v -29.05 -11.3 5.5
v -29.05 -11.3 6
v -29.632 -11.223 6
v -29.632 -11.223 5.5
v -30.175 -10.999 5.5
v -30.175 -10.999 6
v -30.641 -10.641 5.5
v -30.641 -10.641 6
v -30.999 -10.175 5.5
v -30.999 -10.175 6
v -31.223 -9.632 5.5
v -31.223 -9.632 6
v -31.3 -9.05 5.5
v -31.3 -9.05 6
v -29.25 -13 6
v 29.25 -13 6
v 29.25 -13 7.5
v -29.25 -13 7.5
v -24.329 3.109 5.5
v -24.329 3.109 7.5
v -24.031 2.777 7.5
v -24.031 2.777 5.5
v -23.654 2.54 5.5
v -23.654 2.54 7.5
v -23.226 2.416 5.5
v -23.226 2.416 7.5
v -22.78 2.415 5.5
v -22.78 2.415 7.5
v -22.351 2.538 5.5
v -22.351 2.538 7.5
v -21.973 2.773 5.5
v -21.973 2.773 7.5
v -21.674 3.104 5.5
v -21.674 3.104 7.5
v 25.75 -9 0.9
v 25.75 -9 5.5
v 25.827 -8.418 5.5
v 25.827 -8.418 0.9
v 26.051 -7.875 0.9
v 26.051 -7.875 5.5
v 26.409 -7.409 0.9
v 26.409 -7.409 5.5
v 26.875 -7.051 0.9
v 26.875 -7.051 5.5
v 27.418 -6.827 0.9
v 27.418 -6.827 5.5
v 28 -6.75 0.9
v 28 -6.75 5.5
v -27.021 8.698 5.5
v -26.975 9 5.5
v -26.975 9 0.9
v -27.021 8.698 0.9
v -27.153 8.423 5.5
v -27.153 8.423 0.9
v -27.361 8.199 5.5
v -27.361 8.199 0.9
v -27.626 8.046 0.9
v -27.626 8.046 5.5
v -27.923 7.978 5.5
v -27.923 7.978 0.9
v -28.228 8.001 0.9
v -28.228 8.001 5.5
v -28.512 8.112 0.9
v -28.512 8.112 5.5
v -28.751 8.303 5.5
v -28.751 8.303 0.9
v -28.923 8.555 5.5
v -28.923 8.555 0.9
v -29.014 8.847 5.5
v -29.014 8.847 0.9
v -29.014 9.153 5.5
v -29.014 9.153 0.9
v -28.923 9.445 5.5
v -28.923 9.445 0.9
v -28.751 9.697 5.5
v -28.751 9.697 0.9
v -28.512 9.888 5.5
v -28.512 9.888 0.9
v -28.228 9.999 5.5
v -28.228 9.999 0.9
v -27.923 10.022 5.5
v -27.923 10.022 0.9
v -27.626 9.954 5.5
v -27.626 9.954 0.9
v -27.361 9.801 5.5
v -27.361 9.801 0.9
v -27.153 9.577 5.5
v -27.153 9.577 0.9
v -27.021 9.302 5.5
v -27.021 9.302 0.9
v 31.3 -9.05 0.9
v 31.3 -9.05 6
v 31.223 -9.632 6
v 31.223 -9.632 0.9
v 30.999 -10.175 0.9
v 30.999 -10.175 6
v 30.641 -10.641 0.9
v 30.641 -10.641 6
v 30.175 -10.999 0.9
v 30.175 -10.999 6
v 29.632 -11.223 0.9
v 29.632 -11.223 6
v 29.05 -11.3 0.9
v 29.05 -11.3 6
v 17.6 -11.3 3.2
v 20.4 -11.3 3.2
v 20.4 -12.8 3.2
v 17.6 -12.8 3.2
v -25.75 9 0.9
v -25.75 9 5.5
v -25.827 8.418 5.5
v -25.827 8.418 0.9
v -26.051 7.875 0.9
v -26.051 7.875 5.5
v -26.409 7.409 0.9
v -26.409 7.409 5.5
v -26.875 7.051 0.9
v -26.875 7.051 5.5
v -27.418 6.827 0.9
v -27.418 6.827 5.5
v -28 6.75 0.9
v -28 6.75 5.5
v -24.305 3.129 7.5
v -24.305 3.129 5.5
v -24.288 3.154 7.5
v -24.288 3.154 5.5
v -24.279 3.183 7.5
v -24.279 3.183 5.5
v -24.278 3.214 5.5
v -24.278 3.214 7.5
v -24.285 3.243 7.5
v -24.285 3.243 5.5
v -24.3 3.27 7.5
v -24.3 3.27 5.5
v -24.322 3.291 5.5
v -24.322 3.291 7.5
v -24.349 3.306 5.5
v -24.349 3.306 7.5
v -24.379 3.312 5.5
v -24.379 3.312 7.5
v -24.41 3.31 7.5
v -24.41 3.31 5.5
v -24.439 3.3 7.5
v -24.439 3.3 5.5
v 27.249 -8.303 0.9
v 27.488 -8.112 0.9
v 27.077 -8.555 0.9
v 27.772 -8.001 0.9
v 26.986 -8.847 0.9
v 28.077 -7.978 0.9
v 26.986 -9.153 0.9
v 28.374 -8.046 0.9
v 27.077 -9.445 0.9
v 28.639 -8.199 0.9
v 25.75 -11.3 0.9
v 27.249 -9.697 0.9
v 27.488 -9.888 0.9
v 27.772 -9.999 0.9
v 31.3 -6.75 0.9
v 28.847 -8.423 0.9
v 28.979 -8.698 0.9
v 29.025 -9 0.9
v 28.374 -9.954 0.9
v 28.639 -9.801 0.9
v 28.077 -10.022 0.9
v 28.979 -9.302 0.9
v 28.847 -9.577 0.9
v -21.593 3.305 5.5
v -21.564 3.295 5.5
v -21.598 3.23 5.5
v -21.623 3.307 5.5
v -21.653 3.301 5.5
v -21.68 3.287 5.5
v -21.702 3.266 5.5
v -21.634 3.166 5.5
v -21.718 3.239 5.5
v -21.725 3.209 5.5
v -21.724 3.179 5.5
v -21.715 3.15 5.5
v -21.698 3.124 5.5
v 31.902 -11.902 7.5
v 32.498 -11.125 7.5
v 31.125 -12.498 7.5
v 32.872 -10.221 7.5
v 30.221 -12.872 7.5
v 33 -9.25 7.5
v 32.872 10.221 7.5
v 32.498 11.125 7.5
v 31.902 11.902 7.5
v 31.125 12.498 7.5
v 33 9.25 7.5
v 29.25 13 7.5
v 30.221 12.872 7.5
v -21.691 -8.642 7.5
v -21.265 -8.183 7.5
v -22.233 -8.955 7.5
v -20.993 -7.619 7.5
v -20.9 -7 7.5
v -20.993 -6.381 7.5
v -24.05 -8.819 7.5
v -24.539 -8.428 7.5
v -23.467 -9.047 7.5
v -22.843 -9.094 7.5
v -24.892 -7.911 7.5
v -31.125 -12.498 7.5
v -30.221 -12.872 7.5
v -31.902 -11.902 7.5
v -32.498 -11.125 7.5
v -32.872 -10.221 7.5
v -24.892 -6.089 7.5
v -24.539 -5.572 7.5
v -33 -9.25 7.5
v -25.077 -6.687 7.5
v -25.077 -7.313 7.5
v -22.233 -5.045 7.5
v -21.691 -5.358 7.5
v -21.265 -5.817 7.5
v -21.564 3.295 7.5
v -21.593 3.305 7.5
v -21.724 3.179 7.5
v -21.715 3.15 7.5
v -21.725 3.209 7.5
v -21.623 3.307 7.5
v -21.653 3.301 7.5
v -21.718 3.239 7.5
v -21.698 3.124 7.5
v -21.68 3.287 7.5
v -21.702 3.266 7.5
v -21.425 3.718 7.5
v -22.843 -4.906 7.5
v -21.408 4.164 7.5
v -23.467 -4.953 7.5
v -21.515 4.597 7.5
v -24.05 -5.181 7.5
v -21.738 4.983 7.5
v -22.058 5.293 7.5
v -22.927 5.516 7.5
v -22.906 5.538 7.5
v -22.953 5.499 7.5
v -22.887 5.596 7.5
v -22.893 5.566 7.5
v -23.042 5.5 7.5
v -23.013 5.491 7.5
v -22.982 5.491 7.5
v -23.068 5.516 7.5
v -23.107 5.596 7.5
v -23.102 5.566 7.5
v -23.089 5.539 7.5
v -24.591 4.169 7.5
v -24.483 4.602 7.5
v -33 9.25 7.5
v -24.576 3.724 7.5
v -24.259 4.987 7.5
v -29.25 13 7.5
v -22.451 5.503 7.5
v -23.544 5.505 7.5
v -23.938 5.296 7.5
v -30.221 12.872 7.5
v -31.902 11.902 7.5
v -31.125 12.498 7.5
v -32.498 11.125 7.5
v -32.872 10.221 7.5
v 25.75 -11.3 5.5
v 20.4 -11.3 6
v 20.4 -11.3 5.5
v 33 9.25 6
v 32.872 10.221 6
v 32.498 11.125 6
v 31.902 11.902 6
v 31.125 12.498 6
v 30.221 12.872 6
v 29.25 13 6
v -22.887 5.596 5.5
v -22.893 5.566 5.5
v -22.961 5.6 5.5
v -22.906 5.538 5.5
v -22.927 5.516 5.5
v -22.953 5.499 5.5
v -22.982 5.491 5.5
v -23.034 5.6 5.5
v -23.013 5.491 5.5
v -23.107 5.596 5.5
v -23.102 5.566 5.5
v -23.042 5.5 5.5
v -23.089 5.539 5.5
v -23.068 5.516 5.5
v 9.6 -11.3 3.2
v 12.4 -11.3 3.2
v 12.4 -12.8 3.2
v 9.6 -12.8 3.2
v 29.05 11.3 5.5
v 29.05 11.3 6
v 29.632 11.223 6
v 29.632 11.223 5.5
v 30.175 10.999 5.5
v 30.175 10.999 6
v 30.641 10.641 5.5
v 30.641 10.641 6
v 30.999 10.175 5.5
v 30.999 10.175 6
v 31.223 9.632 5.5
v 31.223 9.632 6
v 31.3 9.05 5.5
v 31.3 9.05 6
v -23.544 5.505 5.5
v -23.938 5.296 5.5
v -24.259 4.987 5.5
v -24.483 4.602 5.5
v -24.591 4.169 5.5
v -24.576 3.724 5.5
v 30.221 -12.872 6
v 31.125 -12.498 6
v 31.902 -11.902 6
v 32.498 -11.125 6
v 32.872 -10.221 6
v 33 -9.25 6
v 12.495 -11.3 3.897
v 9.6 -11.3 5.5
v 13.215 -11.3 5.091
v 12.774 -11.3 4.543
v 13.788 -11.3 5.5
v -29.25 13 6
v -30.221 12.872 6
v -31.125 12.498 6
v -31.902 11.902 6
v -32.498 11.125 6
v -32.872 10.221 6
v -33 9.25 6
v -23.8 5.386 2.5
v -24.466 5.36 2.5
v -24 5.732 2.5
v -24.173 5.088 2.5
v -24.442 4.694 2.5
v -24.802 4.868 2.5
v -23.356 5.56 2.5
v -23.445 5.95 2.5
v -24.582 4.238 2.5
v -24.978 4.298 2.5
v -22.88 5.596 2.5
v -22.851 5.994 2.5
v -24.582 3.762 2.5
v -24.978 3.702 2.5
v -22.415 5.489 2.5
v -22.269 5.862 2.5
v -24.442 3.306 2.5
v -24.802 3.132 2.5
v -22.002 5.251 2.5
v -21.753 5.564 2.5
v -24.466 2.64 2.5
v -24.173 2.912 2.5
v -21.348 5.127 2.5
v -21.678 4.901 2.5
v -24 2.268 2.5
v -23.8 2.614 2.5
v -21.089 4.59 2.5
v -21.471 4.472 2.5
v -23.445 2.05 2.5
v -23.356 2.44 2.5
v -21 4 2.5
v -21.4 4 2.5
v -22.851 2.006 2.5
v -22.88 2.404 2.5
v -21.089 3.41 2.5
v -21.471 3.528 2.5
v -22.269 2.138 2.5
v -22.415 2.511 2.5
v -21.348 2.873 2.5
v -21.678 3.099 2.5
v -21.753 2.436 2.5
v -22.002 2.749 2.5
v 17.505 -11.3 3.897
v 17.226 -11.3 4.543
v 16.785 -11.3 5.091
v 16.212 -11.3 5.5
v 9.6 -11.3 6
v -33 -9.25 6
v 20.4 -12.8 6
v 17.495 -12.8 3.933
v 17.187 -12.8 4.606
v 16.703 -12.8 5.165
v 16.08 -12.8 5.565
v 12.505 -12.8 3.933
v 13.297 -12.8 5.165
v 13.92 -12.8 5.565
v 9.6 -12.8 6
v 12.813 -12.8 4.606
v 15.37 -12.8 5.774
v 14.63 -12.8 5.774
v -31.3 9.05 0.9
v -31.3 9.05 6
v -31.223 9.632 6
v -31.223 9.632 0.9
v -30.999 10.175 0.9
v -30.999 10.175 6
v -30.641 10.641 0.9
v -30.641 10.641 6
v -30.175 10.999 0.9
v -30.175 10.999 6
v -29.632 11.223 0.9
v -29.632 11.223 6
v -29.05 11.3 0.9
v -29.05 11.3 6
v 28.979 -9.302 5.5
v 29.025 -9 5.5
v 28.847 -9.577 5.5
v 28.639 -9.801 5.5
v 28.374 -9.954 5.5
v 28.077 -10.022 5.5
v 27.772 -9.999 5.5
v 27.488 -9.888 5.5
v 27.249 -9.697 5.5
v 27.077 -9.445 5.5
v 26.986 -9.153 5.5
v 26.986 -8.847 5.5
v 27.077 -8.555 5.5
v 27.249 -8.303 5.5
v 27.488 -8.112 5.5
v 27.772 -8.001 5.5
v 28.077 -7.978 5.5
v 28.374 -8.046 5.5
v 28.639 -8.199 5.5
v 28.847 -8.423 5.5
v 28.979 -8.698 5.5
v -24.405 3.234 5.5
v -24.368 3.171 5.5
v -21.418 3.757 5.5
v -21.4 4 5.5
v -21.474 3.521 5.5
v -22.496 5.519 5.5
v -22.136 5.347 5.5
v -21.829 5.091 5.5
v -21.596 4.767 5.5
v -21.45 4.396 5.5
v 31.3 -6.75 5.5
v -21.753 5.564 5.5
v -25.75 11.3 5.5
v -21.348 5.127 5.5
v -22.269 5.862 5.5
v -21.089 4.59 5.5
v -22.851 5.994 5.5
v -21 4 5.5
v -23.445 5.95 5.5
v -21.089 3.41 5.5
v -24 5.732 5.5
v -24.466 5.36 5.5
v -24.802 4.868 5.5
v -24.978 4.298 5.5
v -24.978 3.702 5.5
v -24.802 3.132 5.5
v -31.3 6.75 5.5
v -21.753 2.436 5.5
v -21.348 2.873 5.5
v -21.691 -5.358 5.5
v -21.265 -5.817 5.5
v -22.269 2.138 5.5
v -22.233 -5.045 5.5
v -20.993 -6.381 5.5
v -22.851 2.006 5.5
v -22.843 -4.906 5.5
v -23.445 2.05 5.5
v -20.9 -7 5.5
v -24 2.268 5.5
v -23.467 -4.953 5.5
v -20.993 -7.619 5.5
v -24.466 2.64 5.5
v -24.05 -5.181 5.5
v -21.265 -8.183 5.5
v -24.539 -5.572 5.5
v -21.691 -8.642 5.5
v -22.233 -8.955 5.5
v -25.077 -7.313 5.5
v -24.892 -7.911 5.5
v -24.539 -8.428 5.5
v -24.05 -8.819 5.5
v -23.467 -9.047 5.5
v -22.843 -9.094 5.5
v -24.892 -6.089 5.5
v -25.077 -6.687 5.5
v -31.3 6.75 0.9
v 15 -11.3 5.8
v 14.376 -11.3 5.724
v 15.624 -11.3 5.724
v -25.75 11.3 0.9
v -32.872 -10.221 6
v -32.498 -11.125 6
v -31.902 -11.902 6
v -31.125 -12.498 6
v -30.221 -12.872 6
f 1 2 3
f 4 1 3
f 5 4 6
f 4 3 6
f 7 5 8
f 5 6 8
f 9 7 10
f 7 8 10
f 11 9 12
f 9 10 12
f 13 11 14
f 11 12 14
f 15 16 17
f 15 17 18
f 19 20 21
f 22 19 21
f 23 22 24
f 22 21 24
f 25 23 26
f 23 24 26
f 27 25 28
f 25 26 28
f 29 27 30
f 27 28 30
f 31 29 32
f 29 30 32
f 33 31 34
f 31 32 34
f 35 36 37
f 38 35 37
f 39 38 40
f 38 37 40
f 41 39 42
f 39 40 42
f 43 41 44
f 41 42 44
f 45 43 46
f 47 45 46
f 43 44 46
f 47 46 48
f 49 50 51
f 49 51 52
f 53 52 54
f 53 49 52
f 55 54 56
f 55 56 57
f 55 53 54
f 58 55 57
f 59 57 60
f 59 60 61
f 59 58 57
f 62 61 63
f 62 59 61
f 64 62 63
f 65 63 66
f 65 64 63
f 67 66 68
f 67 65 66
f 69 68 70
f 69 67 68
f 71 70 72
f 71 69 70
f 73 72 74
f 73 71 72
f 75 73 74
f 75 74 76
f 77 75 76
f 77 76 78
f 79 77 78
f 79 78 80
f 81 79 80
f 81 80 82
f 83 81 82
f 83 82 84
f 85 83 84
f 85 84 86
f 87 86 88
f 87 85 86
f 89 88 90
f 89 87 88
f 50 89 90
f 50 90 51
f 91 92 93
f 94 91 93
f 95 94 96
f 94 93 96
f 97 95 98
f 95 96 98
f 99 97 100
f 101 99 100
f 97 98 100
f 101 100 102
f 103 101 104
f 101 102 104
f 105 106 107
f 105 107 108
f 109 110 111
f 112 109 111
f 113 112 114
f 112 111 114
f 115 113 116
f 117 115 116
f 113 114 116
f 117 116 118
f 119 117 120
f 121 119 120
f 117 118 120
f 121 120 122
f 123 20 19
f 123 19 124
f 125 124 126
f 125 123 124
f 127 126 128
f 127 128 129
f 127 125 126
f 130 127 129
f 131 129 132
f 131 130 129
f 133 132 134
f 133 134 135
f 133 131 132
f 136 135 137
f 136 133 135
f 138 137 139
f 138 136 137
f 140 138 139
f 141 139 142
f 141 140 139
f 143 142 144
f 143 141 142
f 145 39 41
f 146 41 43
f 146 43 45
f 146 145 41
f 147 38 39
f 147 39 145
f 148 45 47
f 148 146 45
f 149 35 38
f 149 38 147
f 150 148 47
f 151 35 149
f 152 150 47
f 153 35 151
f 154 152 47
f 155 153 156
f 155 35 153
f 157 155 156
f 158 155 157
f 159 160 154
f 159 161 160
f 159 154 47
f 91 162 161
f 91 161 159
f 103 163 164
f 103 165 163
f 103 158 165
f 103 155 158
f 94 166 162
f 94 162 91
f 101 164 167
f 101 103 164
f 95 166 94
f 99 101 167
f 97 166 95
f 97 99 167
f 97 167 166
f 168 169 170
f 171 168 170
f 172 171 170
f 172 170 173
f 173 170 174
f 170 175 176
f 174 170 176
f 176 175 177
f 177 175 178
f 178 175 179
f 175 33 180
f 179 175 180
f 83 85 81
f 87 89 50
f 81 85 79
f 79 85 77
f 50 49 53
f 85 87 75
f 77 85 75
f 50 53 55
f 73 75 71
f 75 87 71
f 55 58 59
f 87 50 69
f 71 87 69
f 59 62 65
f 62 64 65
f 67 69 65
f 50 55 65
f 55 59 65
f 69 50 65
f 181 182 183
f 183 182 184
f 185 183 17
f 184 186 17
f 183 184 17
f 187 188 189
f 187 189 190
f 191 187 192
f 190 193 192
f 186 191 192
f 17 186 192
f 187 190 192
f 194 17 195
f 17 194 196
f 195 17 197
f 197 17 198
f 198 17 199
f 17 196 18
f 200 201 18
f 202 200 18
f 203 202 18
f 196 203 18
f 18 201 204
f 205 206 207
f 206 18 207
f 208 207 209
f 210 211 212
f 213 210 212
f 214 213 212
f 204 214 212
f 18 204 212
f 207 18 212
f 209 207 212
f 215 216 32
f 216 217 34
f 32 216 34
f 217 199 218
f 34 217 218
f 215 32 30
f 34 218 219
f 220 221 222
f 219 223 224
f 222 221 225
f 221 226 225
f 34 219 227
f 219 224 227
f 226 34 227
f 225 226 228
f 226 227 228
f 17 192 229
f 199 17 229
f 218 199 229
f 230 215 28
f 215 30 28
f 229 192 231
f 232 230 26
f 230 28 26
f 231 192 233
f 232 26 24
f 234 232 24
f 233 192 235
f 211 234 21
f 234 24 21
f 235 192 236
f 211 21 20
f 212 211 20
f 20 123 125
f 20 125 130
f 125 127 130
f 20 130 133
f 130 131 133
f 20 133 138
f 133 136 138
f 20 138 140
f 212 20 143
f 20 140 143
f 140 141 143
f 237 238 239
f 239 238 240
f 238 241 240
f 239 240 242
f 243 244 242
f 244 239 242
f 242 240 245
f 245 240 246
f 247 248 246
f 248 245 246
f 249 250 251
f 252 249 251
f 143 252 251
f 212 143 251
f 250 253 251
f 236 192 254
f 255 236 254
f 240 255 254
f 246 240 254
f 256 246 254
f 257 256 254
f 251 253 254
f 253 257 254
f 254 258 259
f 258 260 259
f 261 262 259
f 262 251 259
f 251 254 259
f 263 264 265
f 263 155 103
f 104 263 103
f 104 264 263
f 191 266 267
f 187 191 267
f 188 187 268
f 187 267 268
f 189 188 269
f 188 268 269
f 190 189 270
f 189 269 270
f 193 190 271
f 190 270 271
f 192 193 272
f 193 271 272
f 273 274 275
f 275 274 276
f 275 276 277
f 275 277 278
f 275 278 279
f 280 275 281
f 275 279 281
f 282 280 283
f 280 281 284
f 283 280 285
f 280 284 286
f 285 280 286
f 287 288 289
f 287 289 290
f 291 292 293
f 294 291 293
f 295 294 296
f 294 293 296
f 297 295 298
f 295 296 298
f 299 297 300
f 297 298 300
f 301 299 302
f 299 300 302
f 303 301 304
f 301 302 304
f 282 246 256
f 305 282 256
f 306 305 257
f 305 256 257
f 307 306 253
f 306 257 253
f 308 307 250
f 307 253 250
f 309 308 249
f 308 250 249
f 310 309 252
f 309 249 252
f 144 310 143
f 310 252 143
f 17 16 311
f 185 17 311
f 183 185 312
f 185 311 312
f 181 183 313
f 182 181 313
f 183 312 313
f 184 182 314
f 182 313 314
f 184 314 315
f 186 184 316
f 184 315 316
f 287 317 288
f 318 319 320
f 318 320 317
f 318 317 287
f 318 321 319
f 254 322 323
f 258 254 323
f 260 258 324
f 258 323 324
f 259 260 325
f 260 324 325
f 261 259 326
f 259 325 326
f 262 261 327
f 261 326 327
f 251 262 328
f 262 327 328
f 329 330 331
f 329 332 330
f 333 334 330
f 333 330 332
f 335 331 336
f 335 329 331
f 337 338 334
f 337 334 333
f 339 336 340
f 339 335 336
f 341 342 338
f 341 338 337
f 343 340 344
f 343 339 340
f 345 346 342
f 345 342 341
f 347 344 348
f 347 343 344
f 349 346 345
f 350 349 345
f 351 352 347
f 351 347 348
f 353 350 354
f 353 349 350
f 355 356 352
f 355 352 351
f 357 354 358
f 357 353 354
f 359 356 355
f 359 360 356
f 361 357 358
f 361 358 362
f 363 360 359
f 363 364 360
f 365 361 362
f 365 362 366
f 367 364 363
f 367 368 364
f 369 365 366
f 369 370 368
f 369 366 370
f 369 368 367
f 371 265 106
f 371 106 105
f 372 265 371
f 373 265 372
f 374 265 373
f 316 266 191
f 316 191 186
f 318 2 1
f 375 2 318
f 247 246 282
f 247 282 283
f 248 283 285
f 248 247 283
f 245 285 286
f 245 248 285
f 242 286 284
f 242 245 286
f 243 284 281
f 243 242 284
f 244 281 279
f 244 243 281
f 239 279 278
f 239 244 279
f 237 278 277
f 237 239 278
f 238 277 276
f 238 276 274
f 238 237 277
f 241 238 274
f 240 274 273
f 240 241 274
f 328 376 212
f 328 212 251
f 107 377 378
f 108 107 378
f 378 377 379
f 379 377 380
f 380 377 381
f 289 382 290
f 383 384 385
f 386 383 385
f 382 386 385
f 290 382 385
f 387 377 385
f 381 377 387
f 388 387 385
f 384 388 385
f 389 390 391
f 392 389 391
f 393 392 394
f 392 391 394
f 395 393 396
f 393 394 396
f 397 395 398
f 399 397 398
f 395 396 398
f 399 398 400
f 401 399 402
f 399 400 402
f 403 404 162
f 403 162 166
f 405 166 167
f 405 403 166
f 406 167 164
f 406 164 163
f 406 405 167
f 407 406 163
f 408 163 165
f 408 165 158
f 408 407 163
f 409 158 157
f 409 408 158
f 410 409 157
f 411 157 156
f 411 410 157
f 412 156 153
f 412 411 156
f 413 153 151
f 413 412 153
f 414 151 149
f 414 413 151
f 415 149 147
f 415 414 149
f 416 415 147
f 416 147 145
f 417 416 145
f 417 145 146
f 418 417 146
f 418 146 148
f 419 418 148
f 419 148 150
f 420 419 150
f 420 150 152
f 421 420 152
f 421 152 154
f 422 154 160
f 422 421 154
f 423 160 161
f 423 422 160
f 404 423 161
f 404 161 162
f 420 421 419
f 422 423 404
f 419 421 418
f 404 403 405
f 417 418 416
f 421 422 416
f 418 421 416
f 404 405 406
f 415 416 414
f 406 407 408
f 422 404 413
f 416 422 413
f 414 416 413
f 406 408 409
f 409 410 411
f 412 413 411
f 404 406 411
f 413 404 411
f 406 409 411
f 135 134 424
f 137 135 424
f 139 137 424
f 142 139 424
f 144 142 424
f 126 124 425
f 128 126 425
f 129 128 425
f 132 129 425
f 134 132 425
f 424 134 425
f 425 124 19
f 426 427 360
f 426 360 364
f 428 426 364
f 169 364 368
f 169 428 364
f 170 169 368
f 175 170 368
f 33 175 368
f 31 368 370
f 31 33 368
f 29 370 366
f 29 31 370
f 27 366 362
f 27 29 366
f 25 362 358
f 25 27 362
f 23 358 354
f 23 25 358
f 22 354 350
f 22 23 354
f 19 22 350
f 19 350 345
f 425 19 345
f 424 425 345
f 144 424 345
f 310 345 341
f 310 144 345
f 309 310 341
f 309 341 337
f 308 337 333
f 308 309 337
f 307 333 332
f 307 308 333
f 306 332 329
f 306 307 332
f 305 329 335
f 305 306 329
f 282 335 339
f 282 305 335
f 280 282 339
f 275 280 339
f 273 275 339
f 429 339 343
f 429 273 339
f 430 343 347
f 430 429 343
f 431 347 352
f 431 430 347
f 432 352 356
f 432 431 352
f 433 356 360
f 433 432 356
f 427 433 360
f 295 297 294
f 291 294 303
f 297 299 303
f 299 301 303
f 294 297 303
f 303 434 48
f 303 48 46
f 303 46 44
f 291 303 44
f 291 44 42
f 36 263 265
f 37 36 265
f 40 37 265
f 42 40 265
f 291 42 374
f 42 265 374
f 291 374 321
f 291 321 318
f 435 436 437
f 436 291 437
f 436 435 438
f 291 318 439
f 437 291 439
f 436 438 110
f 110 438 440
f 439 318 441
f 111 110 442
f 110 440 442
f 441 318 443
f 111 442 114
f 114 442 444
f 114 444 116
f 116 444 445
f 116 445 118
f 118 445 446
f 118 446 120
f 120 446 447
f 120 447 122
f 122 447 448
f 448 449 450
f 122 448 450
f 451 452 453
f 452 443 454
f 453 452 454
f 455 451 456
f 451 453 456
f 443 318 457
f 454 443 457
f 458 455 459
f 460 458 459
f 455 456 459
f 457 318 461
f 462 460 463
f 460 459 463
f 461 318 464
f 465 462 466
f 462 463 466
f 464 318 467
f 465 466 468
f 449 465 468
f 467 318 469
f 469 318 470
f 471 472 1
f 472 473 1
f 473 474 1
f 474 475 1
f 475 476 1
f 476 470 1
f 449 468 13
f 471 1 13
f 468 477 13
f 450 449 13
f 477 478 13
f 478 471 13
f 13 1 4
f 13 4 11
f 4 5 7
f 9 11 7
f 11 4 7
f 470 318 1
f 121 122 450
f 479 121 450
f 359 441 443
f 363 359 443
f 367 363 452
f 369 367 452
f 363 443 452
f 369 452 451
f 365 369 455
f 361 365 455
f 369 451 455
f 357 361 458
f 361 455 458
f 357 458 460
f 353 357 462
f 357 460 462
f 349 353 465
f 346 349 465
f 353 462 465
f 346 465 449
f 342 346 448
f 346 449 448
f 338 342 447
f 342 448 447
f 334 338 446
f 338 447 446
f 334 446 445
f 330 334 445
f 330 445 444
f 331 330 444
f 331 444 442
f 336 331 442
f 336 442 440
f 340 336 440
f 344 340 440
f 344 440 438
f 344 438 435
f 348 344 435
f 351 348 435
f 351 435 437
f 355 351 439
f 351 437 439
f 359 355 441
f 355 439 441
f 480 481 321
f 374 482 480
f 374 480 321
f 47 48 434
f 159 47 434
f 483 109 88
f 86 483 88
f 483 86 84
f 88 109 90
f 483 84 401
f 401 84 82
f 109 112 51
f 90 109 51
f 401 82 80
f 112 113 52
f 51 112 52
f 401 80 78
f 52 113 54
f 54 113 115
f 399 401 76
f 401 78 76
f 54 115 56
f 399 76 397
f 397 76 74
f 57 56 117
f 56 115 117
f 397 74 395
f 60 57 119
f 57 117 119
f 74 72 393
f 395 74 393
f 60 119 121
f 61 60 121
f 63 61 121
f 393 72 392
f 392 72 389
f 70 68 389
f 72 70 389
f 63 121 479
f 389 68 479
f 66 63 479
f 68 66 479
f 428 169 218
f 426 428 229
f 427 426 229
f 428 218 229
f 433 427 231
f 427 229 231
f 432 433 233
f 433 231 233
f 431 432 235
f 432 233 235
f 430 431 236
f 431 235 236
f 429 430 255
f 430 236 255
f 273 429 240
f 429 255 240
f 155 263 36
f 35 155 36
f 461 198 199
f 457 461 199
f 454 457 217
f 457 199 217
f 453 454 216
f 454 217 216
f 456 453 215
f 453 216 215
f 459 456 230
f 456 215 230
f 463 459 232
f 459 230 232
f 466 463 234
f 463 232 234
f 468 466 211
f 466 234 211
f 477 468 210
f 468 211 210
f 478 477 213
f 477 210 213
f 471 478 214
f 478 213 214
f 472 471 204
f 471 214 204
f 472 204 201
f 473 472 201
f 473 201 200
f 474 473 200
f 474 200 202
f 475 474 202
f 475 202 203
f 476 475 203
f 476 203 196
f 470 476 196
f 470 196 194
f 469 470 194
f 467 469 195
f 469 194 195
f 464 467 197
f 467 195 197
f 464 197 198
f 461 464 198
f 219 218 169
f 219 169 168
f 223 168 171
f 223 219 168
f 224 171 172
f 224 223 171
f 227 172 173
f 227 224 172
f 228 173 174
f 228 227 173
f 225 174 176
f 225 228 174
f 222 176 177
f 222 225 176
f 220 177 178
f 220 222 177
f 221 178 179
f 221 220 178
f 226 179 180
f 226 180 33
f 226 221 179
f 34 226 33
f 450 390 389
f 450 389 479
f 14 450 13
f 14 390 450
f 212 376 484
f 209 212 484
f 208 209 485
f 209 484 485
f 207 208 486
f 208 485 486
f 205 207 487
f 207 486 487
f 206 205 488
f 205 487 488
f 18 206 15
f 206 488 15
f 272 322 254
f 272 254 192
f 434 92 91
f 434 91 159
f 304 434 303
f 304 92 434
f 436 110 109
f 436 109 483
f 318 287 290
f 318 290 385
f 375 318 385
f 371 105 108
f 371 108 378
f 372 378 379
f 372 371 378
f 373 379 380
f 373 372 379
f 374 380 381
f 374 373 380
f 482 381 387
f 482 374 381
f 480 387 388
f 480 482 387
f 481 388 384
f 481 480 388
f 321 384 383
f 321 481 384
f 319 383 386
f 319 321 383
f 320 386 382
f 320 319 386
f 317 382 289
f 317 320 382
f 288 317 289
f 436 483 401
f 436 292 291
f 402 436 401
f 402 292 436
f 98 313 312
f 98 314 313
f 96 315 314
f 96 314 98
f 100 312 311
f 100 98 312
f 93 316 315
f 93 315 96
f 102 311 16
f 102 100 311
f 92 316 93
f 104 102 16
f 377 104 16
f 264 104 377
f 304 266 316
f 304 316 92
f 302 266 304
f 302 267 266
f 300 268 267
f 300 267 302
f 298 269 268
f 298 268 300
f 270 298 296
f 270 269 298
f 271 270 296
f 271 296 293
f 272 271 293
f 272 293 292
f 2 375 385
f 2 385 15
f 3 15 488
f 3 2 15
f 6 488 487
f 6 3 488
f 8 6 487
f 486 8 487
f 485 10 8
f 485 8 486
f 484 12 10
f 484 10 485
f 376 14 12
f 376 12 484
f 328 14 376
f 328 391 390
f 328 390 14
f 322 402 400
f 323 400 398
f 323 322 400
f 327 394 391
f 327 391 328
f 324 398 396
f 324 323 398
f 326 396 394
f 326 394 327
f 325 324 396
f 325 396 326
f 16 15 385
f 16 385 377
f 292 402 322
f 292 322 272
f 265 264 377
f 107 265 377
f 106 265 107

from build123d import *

# Parameters (mm, degrees)
PAD002_DEPTH  = 1.5
PAD003_DEPTH  = 0.5
SKETCH005_R   = 1.025
PAD004_DEPTH  = 4.6
SKETCH006_R   = 2.1
POCKET_DEPTH  = 2
SKETCH008_R   = 2
SKETCH008_R_2 = 1.6
PAD005_DEPTH  = 3
PAD014_DEPTH  = 1.5


with BuildPart() as part:
    # Sketch003 → Pad002 (new body)
    with BuildSketch(Plane.XY.offset(6)):
        with BuildLine():
            Line((-29.25, 13), (29.25, 13))
            ThreePointArc((33, 9.25), (31.9016504294, 11.9016504294), (29.25, 13))
            Line((33, 9.25), (33, -9.25))
            ThreePointArc((29.25, -13), (31.9016504295, -11.9016504294), (33, -9.25))
            Line((29.25, -13), (-29.25, -13))
            ThreePointArc((-33, -9.25), (-31.9016504294, -11.9016504295), (-29.25, -13))
            Line((-33, -9.25), (-33, 9.25))
            ThreePointArc((-29.25, 13), (-31.9016504294, 11.9016504294), (-33, 9.25))
        make_face()
    extrude(amount=PAD002_DEPTH)

    # Sketch004 → Pad003 (new body)
    with BuildSketch(Plane(origin=(0, 0, 6), x_dir=(1, 0, 0), z_dir=(0, 0, -1))):
        with BuildLine():
            Line((-29.05, 11.3), (29.05, 11.3))
            ThreePointArc((31.3, 9.05), (30.6409902577, 10.6409902577), (29.05, 11.3))
            Line((31.3, 9.05), (31.3, -9.05))
            ThreePointArc((29.05, -11.3), (30.6409902577, -10.6409902577), (31.3, -9.05))
            Line((29.05, -11.3), (-29.05, -11.3))
            ThreePointArc((-31.3, -9.05), (-30.6409902577, -10.6409902577), (-29.05, -11.3))
            Line((-31.3, -9.05), (-31.3, 9.05))
            ThreePointArc((-29.05, 11.3), (-30.6409902577, 10.6409902577), (-31.3, 9.05))
        make_face()
    extrude(amount=PAD003_DEPTH)

    # Sketch005 → Pad004 (new body)
    with BuildSketch(Plane(origin=(0, 0, 5.5), x_dir=(1, 0, 0), z_dir=(0, 0, -1))):
        with BuildLine():
            Line((-25.75, -9), (-25.75, -11.3))
            Line((-25.75, -11.3), (-29.05, -11.3))
            ThreePointArc((-31.3, -9.05), (-30.6409902577, -10.6409902577), (-29.05, -11.3))
            Line((-31.3, -6.75), (-31.3, -9.05))
            Line((-27.9999999923, -6.75), (-31.3, -6.75))
            ThreePointArc((-25.75, -9.0000000077), (-26.4090097369, -7.4090097478), (-27.9999999923, -6.75))
        make_face()
        with Locations((-28, -9)):
            Circle(SKETCH005_R, mode=Mode.SUBTRACT)
        with BuildLine():
            ThreePointArc((25.75, 9), (26.4090097423, 7.4090097423), (28, 6.75))
            Line((28, 6.75), (31.3, 6.75))
            Line((31.3, 9.05), (31.3, 6.75))
            ThreePointArc((31.3, 9.05), (30.6409902577, 10.6409902577), (29.05, 11.3))
            Line((29.05, 11.3), (25.75, 11.3))
            Line((25.75, 11.3), (25.75, 9))
        make_face()
        with Locations((28, 9)):
            Circle(SKETCH005_R, mode=Mode.SUBTRACT)
    extrude(amount=PAD004_DEPTH)

    # Sketch006 → Pocket (cut)
    with BuildSketch(Plane.XY.offset(7.5)):
        with Locations((-23, -7)):
            Circle(SKETCH006_R)
        with BuildLine():
            ThreePointArc((-24.3288922086, 3.1089076939), (-23.0026761128, 2.400002238), (-21.6740960519, 3.1044673539))
            ThreePointArc((-21.5638430432, 3.2946963807), (-21.7108688116, 3.2528448762), (-21.6740960519, 3.1044673539))
            ThreePointArc((-21.5638430432, 3.2946963807), (-21.6130238799, 4.7976824194), (-22.8873953748, 5.5960326433))
            ThreePointArc((-23.1072650483, 5.5964003913), (-22.9975078699, 5.4899979159), (-22.8873953748, 5.5960326433))
            ThreePointArc((-23.1072650483, 5.5964003913), (-24.3843000035, 4.8023175806), (-24.4385082583, 3.2995044678))
            ThreePointArc((-24.3288922086, 3.1089076939), (-24.2916233116, 3.2571613762), (-24.4385082583, 3.2995044678))
        make_face()
    extrude(amount=-POCKET_DEPTH, mode=Mode.SUBTRACT)

    # Sketch008 → Pad005 (new body)
    with BuildSketch(Plane(origin=(0, 0, 5.5), x_dir=(1, 0, 0), z_dir=(0, 0, -1))):
        with Locations((-23, -4)):
            Circle(SKETCH008_R)
        with Locations((-23, -4)):
            Circle(SKETCH008_R_2, mode=Mode.SUBTRACT)
    extrude(amount=PAD005_DEPTH)

    # Sketch023 → Pad014 (new body)
    with BuildSketch(Plane(origin=(0, -11.3, 6), x_dir=(1, 0, 0), z_dir=(0, -1, 0))):
        with BuildLine():
            Line((9.6, 0), (20.4, 0))
            Line((20.4, 0), (20.4, -2.8))
            Line((20.4, -2.8), (17.6, -2.8))
            ThreePointArc((17.6, -2.8), (15, -0.2), (12.4, -2.8))
            Line((12.4, -2.8), (9.6, -2.8))
            Line((9.6, -2.8), (9.6, 0))
        make_face()
    extrude(amount=PAD014_DEPTH)


solid = part.part
